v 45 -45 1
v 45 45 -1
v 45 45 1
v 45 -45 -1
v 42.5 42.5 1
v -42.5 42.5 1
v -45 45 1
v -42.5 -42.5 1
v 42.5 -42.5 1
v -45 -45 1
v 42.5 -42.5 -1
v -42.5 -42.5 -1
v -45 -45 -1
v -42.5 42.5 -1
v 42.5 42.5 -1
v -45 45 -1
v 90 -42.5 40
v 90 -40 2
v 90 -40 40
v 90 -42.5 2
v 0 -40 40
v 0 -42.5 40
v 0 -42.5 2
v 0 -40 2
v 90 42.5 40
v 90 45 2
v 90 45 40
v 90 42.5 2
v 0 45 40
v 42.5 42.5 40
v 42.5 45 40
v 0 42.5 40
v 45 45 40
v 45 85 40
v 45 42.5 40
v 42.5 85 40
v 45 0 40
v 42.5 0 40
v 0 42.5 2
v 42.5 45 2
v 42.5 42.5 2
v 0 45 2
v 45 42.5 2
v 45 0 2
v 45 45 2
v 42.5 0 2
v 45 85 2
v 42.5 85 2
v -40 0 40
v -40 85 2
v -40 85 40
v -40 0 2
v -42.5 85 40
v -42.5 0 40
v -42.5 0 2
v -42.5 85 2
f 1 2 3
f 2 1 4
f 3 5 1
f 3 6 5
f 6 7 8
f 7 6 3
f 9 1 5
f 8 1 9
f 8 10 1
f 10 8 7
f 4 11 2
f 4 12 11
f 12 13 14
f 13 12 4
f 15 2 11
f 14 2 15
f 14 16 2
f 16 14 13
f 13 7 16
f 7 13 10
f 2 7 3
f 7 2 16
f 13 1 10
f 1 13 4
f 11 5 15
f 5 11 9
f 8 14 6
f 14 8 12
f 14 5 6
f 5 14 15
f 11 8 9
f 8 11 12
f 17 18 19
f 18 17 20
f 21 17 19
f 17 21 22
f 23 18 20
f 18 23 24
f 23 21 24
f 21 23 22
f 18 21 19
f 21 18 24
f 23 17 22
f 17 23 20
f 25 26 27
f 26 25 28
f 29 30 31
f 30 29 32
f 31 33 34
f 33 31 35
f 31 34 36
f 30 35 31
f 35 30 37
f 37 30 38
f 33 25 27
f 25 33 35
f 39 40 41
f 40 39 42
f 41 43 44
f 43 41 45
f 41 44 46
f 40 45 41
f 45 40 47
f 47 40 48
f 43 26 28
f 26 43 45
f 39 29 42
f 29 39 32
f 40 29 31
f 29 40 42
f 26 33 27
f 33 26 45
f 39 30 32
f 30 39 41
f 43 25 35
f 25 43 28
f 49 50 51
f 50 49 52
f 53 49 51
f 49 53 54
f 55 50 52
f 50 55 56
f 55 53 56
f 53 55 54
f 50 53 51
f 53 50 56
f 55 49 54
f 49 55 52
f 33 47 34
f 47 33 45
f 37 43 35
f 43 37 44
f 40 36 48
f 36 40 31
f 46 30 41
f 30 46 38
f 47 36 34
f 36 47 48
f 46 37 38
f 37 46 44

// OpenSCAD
// Dimensions for DIY Magnetic Stirrer Housing (80mm PC Fan)
// Units: millimetres

// Overall outer footprint
outer_width = 90;
outer_depth = 90;

// Top plate thickness (rests on bed)
top_thickness = 2;

// Wall thickness
wall_thickness = 2.5;

// Total height of the box (from top plate to open edge)
box_height = 40;

// Screw hole diameter
screw_hole_dia = 4.5;

// Screw hole pattern size (square)
screw_pattern = 71.5;

// Cable notch width
notch_width = 12;

// Cable notch depth from open edge
notch_depth = 8;

// Calculate inner dimensions
inner_width = outer_width - 2 * wall_thickness;
inner_depth = outer_depth - 2 * wall_thickness;

// Calculate wall height (from top of plate to open edge)
wall_height = box_height - top_thickness;

// Calculate screw hole positions (centered on 71.5mm square)
screw_offset = screw_pattern / 2;

// Calculate notch position (centered on one wall, e.g., front wall at Y = -inner_depth/2)
// The notch is on the wall at Y = -inner_depth/2 (front face)
notch_y_center = -inner_depth / 2;
notch_z_start = box_height - notch_depth; // 40 - 8 = 32
notch_z_end = box_height; // 40

// Main body: Top plate
module top_plate() {
    difference() {
        // Solid base plate
        cube([outer_width, outer_depth, top_thickness], center = true);
        
        // Cutout for the hollow box (inner volume)
        translate([0, 0, top_thickness])
            cube([inner_width, inner_depth, box_height - top_thickness], center = true);
    }
}

// Main body: Four walls
module walls() {
    // Front wall (Y = -inner_depth/2)
    translate([0, -inner_depth/2, top_thickness])
        cube([outer_width, wall_thickness, wall_height], center = false);
    
    // Back wall (Y = inner_depth/2)
    translate([0, inner_depth/2, top_thickness])
        cube([outer_width, wall_thickness, wall_height], center = false);
    
    // Left wall (X = -inner_width/2)
    translate([-inner_width/2, 0, top_thickness])
        cube([wall_thickness, inner_depth, wall_height], center = false);
    
    // Right wall (X = inner_width/2)
    translate([inner_width/2, 0, top_thickness])
        cube([wall_thickness, inner_depth, wall_height], center = false);
}

// Cable notch cutout
module cable_notch() {
    // Notch is on the front wall (Y = -inner_depth/2)
    // We cut a rectangular prism from the front face
    translate([0, -inner_depth/2 - wall_thickness/2, notch_z_start])
        cube([notch_width, wall_thickness + 0.01, notch_depth], center = false);
}

// Screw holes
module screw_holes() {
    for (i = [-1, 1]) {
        for (j = [-1, 1]) {
            translate([i * screw_offset, j * screw_offset, 0])
                cylinder(d = screw_hole_dia, h = box_height + 0.01, center = true);
        }
    }
}

// Main assembly
union() {
    // Base plate
    top_plate();
    
    // Walls
    walls();
    
    // Cable notch (difference from walls)
    difference() {
        walls();
        cable_notch();
    }
    
    // Screw holes (difference from plate and walls)
    difference() {
        union() {
            top_plate();
            walls();
        }
        screw_holes();
    }
}
